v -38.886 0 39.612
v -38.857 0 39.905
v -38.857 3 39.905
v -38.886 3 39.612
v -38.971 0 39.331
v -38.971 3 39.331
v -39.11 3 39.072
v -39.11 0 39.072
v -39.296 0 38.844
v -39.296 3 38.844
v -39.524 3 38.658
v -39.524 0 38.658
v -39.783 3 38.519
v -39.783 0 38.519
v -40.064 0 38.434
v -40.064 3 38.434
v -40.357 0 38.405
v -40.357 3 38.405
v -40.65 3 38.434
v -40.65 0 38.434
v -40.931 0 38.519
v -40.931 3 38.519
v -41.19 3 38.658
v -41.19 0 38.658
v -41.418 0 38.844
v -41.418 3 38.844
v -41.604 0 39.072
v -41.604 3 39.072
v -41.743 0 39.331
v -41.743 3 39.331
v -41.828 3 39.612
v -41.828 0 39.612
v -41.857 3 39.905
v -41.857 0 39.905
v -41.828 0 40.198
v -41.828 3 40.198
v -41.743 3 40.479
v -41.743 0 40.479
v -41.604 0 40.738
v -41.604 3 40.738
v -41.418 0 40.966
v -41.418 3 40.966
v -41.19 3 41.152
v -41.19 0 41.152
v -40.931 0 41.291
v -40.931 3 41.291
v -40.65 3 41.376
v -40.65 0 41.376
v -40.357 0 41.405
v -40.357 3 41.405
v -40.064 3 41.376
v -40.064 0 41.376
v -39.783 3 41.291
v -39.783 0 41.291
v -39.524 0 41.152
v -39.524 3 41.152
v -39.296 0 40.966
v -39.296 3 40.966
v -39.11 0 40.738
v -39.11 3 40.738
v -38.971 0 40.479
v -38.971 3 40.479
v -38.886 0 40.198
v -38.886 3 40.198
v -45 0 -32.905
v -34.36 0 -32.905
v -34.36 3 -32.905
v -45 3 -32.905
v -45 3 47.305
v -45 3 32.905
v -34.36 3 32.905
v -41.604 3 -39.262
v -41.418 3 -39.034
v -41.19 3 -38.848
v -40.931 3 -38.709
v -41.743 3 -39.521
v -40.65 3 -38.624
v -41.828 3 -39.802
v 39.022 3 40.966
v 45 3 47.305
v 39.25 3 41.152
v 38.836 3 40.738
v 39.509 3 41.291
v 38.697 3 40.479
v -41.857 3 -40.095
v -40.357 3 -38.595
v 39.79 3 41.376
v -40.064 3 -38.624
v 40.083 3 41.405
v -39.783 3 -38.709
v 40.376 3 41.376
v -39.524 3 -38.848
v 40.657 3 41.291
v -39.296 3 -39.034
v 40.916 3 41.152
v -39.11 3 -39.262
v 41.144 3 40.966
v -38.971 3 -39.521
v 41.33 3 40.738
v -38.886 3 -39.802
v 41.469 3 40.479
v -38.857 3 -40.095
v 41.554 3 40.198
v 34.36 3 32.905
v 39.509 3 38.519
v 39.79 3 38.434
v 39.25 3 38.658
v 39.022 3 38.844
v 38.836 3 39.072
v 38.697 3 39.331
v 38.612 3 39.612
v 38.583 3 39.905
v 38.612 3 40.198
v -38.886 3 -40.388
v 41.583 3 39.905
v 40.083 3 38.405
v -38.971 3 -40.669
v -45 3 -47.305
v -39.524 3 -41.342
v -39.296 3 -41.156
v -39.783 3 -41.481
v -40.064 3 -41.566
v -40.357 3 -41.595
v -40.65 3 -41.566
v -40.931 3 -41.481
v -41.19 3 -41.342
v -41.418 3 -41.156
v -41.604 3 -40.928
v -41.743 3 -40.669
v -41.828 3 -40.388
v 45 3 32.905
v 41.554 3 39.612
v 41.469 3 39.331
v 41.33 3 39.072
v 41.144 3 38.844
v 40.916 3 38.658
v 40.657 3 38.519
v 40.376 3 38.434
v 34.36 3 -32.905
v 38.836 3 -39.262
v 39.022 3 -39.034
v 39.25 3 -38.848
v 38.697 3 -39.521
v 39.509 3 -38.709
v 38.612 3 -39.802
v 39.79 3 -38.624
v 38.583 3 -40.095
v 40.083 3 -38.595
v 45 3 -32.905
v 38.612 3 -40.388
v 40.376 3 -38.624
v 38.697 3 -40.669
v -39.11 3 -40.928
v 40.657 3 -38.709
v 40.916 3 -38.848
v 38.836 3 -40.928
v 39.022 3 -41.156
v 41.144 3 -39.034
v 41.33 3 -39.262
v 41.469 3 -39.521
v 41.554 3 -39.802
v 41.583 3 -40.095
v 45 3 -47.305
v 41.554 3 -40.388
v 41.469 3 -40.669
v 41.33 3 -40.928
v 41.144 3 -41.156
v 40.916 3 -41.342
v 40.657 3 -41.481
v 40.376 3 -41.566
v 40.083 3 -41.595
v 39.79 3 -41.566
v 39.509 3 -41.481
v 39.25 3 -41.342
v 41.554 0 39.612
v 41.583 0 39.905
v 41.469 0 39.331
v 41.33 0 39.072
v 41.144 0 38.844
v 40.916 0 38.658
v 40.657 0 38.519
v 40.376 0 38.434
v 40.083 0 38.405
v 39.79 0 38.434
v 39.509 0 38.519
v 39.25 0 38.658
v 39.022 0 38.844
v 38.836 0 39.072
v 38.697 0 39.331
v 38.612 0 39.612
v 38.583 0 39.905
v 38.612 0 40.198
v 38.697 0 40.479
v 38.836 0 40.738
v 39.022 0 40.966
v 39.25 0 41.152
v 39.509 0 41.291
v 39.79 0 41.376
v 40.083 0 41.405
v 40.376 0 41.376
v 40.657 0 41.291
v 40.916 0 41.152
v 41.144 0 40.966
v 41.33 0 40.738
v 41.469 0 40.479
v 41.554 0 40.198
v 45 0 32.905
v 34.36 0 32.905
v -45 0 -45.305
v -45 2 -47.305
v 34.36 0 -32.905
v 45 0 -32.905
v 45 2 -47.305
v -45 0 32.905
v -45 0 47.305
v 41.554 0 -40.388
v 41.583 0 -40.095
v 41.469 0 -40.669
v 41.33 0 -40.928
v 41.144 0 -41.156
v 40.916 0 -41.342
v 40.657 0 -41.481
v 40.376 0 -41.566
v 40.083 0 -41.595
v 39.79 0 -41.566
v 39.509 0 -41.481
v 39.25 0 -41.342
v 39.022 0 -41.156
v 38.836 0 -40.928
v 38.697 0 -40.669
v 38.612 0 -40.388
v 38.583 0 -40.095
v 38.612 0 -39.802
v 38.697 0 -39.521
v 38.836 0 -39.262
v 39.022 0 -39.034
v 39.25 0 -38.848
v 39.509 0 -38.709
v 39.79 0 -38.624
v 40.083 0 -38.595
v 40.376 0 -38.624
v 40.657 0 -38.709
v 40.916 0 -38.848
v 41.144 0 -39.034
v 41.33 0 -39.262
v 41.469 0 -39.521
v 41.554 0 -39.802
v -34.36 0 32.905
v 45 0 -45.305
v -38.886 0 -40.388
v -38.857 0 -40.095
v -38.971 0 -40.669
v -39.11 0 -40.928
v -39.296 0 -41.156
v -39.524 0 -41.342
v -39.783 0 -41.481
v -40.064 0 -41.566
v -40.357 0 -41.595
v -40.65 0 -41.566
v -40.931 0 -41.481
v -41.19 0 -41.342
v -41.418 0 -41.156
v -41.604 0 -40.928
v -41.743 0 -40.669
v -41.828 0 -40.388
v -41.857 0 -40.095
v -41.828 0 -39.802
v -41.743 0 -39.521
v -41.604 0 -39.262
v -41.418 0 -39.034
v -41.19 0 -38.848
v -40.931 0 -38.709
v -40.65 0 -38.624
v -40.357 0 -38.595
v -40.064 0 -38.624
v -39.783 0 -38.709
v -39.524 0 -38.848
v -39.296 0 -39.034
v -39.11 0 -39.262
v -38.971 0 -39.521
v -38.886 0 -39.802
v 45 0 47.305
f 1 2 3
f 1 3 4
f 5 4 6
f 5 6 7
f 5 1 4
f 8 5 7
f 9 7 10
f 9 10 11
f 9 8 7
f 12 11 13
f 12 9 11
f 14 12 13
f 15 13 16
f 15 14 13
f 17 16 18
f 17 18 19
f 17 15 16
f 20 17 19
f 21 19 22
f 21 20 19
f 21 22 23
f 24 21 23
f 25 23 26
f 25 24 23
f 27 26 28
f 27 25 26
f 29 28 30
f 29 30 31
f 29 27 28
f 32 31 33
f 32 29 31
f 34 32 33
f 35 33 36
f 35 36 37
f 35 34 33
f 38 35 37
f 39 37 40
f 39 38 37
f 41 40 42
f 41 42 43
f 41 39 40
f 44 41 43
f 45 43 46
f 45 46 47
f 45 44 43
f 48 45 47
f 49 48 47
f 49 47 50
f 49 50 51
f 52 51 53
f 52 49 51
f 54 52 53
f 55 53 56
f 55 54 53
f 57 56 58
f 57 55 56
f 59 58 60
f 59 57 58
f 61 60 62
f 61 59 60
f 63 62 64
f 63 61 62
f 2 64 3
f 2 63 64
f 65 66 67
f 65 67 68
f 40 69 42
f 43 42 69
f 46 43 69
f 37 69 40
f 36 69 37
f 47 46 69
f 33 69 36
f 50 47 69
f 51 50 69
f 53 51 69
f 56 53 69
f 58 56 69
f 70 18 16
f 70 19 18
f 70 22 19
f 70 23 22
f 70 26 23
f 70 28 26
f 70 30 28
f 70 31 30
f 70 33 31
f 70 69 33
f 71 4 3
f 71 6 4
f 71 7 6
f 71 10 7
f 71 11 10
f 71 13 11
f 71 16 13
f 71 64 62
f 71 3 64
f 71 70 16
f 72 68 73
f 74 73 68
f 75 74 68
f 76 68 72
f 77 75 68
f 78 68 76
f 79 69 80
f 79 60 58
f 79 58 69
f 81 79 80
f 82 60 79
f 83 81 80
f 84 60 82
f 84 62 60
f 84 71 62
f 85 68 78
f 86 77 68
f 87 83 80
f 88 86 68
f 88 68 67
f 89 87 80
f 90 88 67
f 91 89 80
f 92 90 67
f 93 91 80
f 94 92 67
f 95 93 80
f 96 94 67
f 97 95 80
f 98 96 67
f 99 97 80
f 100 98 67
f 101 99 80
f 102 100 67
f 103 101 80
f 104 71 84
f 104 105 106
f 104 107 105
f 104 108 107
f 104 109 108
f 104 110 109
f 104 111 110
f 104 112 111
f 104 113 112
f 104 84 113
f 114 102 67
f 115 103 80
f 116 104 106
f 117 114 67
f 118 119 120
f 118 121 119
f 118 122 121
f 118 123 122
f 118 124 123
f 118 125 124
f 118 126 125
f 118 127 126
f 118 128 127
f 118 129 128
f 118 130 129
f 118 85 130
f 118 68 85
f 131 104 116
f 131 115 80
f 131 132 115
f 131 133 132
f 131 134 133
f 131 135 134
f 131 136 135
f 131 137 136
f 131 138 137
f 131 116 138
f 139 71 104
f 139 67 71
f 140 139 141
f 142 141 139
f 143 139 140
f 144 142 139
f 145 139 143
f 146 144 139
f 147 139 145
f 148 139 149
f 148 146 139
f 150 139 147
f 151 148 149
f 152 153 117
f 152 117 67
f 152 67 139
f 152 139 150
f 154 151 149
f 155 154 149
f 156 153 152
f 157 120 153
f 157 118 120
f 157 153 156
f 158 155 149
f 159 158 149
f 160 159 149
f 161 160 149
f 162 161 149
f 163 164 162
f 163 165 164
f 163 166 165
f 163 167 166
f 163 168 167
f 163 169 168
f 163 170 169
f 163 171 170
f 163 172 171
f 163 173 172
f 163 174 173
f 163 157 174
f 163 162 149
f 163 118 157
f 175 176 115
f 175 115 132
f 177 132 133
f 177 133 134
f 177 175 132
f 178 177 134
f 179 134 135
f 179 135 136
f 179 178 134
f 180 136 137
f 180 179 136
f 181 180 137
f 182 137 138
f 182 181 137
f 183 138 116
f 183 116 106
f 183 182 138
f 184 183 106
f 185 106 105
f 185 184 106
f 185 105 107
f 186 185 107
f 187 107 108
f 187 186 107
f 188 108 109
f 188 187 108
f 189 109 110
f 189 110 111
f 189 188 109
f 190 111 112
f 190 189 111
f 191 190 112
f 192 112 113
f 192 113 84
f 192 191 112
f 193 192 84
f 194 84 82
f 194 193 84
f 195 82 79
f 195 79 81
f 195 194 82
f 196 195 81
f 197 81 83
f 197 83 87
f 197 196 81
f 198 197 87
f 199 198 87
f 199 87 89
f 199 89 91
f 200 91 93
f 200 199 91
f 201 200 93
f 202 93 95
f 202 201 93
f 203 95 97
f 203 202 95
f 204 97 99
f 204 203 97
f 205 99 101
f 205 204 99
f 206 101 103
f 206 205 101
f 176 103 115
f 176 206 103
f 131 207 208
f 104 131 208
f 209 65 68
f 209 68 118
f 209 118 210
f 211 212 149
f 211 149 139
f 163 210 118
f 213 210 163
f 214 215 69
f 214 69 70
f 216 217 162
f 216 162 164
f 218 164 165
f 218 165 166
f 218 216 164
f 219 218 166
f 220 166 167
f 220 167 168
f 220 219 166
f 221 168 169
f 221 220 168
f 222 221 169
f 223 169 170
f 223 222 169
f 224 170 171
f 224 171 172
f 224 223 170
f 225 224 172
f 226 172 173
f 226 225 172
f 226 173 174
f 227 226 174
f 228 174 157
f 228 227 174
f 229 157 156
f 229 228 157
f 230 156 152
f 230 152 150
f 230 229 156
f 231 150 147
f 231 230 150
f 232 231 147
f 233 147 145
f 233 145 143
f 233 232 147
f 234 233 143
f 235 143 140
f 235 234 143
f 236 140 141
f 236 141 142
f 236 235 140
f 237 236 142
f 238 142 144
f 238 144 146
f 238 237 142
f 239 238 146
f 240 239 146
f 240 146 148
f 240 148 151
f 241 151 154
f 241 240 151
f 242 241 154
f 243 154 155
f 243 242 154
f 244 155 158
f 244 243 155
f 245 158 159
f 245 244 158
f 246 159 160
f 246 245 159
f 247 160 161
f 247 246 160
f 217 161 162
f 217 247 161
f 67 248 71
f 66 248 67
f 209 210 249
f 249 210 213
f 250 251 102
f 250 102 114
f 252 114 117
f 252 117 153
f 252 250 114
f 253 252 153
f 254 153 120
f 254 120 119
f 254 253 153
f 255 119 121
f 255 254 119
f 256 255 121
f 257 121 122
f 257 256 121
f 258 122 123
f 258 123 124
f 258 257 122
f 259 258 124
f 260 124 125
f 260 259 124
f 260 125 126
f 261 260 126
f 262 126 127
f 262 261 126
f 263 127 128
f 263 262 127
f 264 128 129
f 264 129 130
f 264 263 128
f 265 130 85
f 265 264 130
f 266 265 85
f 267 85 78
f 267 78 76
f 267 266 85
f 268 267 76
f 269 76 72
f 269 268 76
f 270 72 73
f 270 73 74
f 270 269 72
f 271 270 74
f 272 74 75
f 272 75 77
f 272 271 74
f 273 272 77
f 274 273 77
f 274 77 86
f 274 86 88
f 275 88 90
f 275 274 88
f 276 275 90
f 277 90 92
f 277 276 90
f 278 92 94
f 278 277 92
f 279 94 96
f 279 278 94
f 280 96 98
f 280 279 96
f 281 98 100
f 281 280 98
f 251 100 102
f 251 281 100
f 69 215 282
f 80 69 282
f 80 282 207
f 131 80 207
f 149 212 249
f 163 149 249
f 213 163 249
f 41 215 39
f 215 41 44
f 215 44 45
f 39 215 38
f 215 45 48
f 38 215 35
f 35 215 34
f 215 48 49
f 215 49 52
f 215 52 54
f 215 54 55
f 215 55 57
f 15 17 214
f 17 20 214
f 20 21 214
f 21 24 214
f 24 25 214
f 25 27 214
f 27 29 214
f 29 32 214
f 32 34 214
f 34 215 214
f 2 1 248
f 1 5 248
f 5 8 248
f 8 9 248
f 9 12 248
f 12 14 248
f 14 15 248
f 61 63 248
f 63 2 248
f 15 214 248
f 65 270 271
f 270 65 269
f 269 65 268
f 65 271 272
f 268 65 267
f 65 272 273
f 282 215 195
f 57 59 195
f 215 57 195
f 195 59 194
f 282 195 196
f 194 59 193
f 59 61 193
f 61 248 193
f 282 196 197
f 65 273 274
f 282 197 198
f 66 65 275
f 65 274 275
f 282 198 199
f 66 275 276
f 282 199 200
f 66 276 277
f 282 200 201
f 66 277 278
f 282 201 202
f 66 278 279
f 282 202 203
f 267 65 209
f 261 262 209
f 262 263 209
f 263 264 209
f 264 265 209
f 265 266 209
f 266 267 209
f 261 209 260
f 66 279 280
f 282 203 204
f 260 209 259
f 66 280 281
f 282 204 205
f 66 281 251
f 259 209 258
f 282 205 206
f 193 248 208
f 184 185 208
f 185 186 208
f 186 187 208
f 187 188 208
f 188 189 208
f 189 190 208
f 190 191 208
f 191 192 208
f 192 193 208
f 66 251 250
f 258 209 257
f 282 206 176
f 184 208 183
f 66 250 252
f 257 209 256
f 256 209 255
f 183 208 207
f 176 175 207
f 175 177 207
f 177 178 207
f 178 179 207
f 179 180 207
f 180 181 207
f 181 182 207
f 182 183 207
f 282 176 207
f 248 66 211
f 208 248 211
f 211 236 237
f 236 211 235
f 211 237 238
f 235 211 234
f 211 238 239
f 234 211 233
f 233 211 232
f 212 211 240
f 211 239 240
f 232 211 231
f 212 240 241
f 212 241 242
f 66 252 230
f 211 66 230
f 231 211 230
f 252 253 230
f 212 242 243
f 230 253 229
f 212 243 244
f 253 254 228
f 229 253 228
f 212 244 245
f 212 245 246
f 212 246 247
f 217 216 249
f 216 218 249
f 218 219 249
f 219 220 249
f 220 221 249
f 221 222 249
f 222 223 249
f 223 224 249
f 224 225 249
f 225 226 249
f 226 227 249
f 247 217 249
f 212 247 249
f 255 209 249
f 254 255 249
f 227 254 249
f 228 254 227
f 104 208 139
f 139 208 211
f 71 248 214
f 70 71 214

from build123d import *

# Parameters (mm, degrees)
SKETCH2_W           = 90
SKETCH2_H           = 94.61
SKETCH2_R           = 1.5
BOSS_EXTRUDE1_DEPTH = 3
SKETCH3_W           = 10.64
SKETCH3_H           = 65.81
CUT_EXTRUDE1_DEPTH  = 10
CHAMFER1_SIZE       = 2


with BuildPart() as part:
    # Sketch2 → Boss-Extrude1 (new body)
    with BuildSketch(Plane(origin=(0, 0, 0), x_dir=(1, 0, 0), z_dir=(0, 1, 0))):
        Rectangle(SKETCH2_W, SKETCH2_H)
        with Locations((40.082878696, -39.905)):
            Circle(SKETCH2_R, mode=Mode.SUBTRACT)
        with Locations((-40.357121304, -39.905)):
            Circle(SKETCH2_R, mode=Mode.SUBTRACT)
        with Locations((40.082878696, 40.095)):
            Circle(SKETCH2_R, mode=Mode.SUBTRACT)
        with Locations((-40.357121304, 40.095)):
            Circle(SKETCH2_R, mode=Mode.SUBTRACT)
    extrude(amount=BOSS_EXTRUDE1_DEPTH)

    # Sketch3 → Cut-Extrude1 (cut)
    with BuildSketch(Plane(origin=(0, 0, 0), x_dir=(-1, 0, 0), z_dir=(0, -1, 0))):
        with Locations((39.68, 0)):
            Rectangle(SKETCH3_W, SKETCH3_H)
        with Locations((-39.68, 0)):
            Rectangle(SKETCH3_W, SKETCH3_H)
    extrude(amount=-CUT_EXTRUDE1_DEPTH, mode=Mode.SUBTRACT)

    # Chamfer1
    chamfer1_edges = [part.edges().sort_by_distance(p)[0] for p in [
        (0, 0, -47.305),
    ]]
    chamfer(chamfer1_edges, length=CHAMFER1_SIZE)


solid = part.part
